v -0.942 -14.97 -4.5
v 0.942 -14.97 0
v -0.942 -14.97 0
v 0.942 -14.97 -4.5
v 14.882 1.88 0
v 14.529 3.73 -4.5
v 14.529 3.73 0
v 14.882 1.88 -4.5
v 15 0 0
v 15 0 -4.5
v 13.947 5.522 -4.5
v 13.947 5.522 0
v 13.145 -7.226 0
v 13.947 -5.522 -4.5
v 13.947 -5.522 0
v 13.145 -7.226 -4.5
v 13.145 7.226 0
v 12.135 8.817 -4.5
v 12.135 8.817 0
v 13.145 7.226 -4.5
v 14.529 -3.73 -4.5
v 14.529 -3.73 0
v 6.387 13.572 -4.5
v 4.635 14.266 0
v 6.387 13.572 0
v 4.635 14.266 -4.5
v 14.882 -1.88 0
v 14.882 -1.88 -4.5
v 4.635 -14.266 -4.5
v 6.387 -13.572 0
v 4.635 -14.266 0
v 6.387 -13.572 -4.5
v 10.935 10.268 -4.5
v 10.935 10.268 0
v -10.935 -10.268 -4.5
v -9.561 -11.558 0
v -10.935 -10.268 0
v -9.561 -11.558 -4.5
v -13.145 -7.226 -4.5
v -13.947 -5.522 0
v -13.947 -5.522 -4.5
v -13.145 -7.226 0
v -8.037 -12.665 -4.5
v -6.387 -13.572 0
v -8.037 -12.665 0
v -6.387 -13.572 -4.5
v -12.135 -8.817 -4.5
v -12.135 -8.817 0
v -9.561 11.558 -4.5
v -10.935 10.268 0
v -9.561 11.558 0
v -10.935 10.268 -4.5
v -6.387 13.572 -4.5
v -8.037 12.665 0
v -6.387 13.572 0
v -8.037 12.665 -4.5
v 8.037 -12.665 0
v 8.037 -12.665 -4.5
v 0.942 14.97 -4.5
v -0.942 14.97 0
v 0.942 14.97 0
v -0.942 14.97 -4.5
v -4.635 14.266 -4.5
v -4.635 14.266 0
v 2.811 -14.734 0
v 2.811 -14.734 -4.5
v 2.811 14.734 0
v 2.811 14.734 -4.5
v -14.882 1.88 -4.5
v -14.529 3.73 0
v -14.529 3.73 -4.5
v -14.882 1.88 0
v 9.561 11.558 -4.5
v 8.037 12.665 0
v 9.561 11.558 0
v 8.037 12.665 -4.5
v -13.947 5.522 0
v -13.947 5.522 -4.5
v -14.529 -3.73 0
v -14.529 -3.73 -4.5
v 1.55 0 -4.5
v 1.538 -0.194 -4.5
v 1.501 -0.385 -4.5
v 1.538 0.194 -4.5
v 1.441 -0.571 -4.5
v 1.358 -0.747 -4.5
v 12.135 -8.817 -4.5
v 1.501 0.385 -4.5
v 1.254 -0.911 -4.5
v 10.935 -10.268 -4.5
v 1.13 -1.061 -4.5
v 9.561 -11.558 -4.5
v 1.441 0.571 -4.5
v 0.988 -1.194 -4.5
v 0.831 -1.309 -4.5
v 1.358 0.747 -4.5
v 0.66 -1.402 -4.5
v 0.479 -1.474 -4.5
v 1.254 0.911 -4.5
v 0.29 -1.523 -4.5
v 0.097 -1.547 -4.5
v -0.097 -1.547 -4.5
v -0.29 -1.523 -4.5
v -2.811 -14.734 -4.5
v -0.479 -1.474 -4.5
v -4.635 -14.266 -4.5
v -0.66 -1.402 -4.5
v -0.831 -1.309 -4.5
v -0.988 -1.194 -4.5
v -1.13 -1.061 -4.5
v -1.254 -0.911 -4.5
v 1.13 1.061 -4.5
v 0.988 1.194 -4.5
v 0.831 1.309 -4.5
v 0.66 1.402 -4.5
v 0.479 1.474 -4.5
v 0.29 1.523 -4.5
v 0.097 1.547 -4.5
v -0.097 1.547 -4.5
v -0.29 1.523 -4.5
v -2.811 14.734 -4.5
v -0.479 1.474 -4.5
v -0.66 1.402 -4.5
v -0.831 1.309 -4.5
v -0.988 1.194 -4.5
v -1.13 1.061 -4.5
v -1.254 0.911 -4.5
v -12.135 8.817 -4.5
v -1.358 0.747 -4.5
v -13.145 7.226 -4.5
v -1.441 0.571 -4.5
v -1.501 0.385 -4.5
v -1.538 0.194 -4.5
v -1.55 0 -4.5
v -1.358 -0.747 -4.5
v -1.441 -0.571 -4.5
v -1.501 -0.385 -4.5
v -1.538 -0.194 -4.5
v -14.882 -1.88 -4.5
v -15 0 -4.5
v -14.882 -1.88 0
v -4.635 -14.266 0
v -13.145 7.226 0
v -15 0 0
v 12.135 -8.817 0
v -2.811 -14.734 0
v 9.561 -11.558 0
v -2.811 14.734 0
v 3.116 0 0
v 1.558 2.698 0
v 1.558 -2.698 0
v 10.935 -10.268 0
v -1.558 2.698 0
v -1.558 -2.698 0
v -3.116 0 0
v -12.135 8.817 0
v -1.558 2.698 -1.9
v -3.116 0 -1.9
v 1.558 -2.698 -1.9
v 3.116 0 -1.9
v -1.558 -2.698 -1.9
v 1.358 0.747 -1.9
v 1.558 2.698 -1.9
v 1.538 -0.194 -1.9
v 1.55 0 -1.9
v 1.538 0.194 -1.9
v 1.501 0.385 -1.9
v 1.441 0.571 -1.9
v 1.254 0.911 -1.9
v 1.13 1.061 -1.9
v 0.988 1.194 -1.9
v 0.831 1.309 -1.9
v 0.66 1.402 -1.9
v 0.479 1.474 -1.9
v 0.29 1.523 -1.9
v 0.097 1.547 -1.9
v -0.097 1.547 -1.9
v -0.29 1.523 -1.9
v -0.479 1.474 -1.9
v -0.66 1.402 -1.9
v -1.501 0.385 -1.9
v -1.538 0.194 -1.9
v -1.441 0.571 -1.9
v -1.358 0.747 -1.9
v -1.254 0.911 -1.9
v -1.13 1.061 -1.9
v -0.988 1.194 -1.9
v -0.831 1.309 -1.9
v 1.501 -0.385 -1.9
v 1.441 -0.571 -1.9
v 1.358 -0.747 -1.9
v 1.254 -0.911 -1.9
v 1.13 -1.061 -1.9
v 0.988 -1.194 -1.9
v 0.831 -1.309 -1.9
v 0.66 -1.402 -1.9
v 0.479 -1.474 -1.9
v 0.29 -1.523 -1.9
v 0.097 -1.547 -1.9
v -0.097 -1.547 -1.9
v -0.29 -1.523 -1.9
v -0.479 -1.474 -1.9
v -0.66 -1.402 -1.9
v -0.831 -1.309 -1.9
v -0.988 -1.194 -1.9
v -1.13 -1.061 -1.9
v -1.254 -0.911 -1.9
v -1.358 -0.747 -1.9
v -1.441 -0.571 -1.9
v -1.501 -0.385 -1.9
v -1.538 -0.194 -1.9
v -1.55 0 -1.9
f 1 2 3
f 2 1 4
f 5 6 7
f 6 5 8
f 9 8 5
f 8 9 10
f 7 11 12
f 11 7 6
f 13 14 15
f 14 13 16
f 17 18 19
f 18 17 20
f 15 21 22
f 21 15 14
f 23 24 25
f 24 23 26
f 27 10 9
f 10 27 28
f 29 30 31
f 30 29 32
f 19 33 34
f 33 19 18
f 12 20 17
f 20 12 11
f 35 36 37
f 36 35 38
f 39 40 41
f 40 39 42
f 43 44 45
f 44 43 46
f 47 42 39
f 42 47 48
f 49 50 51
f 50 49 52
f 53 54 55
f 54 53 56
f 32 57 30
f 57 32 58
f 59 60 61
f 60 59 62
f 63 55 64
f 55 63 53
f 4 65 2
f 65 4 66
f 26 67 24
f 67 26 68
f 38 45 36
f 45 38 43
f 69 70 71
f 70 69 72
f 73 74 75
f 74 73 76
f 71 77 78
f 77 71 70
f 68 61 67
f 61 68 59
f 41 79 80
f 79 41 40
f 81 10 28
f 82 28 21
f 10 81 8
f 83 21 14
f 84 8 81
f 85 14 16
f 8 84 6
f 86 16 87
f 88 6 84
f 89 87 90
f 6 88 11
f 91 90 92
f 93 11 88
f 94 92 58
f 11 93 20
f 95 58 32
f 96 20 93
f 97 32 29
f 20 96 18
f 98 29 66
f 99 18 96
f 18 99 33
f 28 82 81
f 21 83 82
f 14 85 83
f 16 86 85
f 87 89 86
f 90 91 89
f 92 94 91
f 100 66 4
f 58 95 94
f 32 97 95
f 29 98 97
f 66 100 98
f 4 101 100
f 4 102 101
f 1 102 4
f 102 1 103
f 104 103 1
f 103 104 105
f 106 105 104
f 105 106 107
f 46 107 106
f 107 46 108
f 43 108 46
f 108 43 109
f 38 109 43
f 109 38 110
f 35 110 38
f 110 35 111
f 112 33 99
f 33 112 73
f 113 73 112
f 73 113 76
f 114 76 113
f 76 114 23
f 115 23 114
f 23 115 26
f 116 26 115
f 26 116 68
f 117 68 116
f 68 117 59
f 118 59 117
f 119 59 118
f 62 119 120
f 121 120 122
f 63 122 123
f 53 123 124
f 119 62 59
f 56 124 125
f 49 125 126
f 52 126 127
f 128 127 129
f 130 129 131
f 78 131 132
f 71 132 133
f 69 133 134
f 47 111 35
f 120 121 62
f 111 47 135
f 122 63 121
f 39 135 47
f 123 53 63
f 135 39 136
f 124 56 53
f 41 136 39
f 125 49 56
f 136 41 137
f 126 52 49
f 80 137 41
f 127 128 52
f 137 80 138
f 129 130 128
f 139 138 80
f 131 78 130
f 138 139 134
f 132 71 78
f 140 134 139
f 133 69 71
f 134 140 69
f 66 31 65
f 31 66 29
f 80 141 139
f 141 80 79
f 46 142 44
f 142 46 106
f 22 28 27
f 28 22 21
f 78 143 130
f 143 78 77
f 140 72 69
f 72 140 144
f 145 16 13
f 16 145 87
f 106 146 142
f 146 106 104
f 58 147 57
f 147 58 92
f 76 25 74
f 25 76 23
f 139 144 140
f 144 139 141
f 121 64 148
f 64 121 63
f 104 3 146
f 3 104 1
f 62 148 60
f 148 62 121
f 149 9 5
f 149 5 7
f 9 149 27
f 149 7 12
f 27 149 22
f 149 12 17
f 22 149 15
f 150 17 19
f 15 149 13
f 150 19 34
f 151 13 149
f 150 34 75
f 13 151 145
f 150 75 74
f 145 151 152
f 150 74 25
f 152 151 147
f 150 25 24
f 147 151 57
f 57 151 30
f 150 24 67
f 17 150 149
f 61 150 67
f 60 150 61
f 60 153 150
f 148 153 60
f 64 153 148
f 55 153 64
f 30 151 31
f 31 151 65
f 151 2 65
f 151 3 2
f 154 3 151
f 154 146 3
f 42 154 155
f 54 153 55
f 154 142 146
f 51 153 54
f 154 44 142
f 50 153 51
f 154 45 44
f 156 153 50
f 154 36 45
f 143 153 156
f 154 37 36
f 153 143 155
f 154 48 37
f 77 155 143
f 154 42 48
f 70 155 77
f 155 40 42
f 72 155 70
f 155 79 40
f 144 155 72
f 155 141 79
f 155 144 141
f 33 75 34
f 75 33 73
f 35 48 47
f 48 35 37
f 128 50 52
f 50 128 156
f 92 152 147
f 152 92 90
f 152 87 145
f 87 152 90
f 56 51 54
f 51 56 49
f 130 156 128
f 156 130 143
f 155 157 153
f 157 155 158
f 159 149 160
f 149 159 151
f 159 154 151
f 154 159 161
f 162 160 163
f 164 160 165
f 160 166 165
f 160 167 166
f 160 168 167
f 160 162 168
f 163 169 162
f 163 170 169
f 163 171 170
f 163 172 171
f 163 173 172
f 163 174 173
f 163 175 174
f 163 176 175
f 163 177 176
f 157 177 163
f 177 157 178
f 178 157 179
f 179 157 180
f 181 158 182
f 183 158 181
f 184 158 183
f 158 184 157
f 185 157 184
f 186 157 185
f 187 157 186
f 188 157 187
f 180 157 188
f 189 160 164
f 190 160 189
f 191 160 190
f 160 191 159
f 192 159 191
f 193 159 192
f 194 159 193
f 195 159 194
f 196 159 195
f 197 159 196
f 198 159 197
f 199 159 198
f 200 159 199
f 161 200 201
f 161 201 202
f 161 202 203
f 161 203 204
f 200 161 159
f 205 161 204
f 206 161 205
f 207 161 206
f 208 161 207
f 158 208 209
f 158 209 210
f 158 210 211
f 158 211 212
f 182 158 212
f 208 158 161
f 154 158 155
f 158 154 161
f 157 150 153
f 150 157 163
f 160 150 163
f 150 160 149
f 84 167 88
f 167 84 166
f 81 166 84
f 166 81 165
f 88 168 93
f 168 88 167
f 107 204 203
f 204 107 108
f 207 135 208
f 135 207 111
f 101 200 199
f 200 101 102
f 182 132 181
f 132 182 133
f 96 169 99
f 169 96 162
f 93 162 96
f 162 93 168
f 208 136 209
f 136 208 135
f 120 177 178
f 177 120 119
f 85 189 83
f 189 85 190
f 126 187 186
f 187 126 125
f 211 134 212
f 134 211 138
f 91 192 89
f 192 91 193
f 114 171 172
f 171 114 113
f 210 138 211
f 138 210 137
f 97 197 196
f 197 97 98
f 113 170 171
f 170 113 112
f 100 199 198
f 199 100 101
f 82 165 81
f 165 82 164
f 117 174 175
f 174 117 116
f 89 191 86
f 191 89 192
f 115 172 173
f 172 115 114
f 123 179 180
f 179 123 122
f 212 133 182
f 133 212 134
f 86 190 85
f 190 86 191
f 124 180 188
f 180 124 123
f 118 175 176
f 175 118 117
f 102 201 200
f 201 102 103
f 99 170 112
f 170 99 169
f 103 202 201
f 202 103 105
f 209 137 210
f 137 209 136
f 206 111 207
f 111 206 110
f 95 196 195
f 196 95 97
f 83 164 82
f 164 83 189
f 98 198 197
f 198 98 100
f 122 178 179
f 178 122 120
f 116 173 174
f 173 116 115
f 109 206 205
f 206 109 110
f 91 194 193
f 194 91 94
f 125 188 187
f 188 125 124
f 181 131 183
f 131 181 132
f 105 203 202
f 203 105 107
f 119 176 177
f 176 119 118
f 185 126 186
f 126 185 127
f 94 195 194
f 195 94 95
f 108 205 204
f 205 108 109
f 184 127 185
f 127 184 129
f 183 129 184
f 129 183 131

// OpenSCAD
$fn = 50;


difference() {
	union() {
		translate(v = [0, 0, -4.5000000000]) {
			cylinder(h = 4.5000000000, r = 15.0000000000);
		}
		translate(v = [0, 0, -3.0000000000]) {
			cylinder(h = 3, r = 2.8750000000);
		}
	}
	union() {
		translate(v = [0, 0, 0]) {
			rotate(a = [0, 0, 0]) {
				difference() {
					union() {
						translate(v = [0, 0, -1.9000000000]) {
							linear_extrude(height = 1.9000000000) {
								polygon(points = [[3.1158000000, 0.0000000000], [1.5579000000, 2.6983619531], [-1.5579000000, 2.6983619531], [-3.1158000000, 0.0000000000], [-1.5579000000, -2.6983619531], [1.5579000000, -2.6983619531]]);
							}
						}
					}
					union();
				}
			}
		}
		#translate(v = [0, 0, -100.0000000000]) {
			cylinder(h = 200, r = 1.5500000000);
		}
	}
}
